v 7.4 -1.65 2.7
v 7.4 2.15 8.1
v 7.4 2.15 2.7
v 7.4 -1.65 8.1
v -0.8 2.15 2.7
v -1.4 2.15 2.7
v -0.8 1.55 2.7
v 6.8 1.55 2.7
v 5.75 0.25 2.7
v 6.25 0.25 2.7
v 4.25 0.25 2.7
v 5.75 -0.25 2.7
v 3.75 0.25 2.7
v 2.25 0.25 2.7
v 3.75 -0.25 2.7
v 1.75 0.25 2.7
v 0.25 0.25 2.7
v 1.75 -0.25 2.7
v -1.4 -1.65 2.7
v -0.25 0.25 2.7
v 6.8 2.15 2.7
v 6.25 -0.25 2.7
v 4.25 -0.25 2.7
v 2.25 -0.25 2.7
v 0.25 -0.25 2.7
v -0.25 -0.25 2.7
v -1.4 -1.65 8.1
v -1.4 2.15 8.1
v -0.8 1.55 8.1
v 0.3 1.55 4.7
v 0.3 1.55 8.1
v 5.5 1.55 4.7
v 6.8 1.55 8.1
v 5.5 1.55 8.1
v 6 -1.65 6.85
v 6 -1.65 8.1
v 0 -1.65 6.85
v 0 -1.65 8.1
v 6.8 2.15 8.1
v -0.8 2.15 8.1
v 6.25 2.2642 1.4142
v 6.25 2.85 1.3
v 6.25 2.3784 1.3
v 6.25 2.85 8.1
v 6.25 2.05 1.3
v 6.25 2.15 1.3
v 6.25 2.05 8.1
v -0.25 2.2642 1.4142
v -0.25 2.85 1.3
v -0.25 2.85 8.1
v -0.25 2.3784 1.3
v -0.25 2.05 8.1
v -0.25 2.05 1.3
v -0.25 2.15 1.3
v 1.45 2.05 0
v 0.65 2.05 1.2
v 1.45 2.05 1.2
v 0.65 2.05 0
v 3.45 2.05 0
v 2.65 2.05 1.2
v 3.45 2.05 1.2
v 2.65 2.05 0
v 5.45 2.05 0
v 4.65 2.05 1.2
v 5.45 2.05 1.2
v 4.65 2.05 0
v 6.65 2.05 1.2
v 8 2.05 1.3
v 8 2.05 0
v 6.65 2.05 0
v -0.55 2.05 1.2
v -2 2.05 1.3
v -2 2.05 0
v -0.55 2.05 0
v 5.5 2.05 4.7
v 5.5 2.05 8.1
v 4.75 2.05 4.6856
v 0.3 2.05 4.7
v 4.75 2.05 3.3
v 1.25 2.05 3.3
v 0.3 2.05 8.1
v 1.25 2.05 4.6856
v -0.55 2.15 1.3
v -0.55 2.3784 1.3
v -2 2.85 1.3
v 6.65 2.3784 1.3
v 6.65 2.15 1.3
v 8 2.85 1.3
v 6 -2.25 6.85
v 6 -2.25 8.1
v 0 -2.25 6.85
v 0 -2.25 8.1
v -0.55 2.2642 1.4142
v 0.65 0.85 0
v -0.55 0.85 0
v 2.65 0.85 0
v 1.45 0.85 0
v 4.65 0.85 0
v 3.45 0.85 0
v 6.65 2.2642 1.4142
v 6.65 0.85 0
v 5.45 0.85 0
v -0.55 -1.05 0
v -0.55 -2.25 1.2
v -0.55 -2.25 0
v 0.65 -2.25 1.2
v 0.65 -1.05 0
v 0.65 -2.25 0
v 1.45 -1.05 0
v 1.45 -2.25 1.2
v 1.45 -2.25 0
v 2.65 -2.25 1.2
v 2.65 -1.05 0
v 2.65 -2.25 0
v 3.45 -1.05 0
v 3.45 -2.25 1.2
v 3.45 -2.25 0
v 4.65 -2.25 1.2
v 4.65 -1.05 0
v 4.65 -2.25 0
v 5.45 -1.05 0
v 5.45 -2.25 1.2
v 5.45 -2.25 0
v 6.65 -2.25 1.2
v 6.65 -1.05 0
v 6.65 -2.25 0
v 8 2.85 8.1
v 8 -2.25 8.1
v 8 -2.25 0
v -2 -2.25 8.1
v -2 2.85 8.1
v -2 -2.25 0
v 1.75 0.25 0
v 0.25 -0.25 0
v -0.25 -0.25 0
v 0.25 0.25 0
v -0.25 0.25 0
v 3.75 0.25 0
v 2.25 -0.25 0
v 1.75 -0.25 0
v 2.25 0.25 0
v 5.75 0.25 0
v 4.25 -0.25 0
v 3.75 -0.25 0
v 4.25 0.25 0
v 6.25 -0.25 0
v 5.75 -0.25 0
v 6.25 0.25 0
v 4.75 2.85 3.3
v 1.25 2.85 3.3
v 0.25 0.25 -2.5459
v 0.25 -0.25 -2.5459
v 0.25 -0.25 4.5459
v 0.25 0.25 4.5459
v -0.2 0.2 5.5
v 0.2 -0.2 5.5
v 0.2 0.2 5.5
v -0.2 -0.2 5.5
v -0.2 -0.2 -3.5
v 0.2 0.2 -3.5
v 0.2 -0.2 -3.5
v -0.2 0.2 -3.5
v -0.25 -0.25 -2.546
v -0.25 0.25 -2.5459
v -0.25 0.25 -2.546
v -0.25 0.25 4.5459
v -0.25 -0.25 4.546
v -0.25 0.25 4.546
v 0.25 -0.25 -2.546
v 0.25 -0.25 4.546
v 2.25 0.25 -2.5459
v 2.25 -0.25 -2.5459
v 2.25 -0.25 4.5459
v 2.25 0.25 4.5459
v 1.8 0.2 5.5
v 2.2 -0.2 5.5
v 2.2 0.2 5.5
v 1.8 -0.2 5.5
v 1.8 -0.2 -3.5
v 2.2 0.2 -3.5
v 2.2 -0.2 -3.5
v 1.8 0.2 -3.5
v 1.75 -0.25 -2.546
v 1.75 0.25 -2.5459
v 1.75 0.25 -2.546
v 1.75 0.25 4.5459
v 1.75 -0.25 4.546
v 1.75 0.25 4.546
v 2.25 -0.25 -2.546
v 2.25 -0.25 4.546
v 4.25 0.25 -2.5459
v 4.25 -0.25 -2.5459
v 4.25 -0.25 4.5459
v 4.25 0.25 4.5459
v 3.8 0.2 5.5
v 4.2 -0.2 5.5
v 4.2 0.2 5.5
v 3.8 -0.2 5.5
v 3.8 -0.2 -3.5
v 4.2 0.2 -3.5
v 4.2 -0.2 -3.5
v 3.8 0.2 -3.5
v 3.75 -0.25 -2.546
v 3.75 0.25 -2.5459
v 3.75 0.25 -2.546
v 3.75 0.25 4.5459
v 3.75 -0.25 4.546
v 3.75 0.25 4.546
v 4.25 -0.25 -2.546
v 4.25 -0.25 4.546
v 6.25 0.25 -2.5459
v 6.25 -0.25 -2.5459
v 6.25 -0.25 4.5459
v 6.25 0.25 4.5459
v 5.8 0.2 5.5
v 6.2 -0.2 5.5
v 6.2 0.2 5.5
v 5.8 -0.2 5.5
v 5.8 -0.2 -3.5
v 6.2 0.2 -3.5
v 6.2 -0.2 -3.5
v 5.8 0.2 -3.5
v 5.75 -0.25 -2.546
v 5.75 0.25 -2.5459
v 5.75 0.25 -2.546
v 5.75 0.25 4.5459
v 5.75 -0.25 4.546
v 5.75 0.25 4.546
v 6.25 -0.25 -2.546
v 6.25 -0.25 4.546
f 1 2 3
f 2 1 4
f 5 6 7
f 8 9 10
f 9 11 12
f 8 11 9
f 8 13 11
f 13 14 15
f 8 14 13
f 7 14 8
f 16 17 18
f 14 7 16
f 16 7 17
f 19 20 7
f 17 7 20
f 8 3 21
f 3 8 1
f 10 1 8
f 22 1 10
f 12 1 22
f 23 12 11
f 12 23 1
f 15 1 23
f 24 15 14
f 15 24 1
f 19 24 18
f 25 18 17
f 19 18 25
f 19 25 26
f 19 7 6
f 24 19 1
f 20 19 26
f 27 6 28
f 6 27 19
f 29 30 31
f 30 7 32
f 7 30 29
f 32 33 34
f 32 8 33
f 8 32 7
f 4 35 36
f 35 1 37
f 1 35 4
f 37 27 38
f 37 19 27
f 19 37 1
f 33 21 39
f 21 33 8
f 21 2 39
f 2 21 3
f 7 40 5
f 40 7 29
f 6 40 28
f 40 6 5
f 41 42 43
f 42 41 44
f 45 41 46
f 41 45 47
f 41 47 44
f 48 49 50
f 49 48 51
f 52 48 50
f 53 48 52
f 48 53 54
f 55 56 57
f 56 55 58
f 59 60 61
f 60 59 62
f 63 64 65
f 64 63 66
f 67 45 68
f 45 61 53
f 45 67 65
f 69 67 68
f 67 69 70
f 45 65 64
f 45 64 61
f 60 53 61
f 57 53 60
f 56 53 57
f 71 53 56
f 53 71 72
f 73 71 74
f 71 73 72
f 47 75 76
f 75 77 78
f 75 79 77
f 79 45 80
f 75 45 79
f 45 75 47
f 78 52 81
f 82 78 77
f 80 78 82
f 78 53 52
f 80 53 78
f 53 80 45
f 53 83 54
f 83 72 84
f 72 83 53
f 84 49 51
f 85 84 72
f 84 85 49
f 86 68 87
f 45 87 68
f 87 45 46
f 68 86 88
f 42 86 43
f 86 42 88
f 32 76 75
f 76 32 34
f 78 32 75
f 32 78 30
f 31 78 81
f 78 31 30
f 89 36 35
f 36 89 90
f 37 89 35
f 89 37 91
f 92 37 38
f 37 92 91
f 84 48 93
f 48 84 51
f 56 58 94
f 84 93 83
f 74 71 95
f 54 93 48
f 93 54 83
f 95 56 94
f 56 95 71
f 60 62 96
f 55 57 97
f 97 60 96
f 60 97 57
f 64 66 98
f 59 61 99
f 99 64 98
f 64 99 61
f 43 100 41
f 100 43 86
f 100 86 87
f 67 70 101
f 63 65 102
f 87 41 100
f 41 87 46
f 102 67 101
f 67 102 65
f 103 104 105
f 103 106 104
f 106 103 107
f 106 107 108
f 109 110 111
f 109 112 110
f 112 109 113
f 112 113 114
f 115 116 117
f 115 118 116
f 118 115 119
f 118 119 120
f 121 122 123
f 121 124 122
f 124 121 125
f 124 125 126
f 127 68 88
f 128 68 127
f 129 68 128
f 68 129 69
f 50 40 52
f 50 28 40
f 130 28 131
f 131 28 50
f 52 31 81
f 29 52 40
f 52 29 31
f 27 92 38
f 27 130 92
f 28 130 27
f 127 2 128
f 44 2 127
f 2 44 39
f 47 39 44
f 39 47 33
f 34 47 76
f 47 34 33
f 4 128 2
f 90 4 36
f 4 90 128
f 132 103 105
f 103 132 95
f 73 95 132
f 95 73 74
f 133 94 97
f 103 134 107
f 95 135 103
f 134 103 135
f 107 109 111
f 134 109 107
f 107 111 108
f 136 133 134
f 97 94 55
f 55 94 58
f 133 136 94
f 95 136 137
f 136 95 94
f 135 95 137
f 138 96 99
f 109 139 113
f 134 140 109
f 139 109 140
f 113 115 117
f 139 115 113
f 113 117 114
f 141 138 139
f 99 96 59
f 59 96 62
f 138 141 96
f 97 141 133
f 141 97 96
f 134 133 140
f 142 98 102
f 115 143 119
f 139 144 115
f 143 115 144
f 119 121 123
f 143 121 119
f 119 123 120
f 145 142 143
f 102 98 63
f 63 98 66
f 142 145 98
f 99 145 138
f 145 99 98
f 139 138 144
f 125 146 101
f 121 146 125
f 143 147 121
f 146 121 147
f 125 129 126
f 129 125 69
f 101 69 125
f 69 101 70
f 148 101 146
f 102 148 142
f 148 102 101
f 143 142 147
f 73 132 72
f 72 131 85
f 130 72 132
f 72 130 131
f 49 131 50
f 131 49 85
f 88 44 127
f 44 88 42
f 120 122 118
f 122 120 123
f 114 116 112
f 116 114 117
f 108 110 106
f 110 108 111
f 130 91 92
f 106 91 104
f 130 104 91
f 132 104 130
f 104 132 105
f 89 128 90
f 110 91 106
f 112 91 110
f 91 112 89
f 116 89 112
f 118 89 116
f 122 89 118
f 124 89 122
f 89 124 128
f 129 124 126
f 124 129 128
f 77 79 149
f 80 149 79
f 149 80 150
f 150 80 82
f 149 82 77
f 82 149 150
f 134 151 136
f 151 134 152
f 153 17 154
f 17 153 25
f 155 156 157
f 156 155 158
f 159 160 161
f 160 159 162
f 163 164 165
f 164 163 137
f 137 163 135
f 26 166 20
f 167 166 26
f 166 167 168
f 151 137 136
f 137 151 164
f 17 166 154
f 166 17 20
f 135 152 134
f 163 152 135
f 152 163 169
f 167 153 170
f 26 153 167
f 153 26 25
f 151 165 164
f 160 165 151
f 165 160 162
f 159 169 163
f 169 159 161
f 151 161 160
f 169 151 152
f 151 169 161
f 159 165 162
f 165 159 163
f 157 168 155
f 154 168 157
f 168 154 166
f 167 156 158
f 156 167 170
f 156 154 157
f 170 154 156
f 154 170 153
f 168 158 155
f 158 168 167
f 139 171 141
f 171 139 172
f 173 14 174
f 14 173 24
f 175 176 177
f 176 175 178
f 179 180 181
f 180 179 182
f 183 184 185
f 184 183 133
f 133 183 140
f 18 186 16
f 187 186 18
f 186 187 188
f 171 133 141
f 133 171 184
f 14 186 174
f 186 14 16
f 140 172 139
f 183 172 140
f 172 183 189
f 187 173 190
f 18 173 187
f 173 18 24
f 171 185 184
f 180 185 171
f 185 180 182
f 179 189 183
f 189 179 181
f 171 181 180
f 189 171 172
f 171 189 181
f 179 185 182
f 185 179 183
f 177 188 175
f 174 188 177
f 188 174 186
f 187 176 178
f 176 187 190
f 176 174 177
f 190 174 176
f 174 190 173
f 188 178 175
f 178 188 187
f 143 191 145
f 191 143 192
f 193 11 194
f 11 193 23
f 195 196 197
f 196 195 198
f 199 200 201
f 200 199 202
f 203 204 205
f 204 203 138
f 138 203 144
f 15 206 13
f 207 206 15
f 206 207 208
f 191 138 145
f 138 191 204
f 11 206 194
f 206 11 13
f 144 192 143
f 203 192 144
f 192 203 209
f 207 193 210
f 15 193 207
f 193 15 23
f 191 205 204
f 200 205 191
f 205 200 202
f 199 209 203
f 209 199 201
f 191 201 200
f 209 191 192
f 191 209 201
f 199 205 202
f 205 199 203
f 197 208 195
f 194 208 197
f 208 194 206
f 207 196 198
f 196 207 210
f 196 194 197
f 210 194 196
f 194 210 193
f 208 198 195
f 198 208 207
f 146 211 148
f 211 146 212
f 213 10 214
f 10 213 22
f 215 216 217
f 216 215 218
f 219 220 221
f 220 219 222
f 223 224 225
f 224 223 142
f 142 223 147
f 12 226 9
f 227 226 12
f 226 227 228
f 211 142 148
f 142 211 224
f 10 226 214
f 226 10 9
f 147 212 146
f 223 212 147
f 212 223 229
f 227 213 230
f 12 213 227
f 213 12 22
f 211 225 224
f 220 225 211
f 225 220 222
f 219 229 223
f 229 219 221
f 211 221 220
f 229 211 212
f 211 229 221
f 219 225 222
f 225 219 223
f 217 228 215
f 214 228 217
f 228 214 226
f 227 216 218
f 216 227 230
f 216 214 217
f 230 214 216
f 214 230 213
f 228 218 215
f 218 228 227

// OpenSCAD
module pin(pin_heigth=9,pin_size=0.5,pin_angle=3,pin_chanfer=0.05)
{
    epsilon=0.01;
    difference(){
        cube([pin_size,pin_size,pin_heigth]);
        translate([-epsilon,pin_size-pin_chanfer,0])rotate([-pin_angle,0,0])cube([pin_size+2*epsilon,pin_size,pin_heigth]);
        translate([-epsilon,pin_chanfer,0])rotate([pin_angle,0,0])translate([0,-pin_size,0])cube([pin_size+2*epsilon,pin_size,pin_heigth]);     
        translate([pin_size-pin_chanfer,-epsilon,0])rotate([0,pin_angle,0])cube([pin_size,pin_size+2*epsilon,pin_heigth]);
        translate([pin_chanfer,-epsilon,0])rotate([0,-pin_angle,0])translate([-pin_size,0,0])cube([pin_size,pin_size+2*epsilon,pin_heigth]);
        translate([-epsilon,pin_size-pin_chanfer,pin_heigth])rotate([pin_angle,0,0])translate([0,0,-pin_heigth])cube([pin_size+2*epsilon,pin_size,pin_heigth]);
        translate([-epsilon,pin_chanfer,pin_heigth])rotate([-pin_angle,0,0])translate([0,-pin_size,-pin_heigth])cube([pin_size+2*epsilon,pin_size,pin_heigth]);     
        translate([pin_size-pin_chanfer,-epsilon,pin_heigth])rotate([0,-pin_angle,0])translate([0,0,-pin_heigth])cube([pin_size,pin_size+2*epsilon,pin_heigth]);
        translate([pin_chanfer,-epsilon,pin_heigth])rotate([0,pin_angle,0])translate([-pin_size,0,-pin_heigth])cube([pin_size,pin_size+2*epsilon,pin_heigth]);
     
    }
}


epsilon = 1e-3;
translate([-2,-2.25,0])union(){
    difference(){
        cube([10,5.1,8.1]);
        union(){
            translate([0.6,0.6,2.7])union(){
                cube([10-2*0.6,3.2,5.4+2*epsilon]);
                translate([8.2,0.6,0])cube([0.6,3.2,5.4+2*epsilon]);
                translate([0,0.6,0])cube([0.6,3.2,5.4+2*epsilon]);
            }
            translate([1.75,4.3,-1])cube([6.5,2,10]);
            translate([-epsilon,4.3,-epsilon])cube([10+2*epsilon,0.9+epsilon,1.3+epsilon]);
            translate([2.3,3.7,4.7])cube([5.2,1,3.4+epsilon]);
            translate([2,-epsilon,6.85])cube([6,1,1.25+epsilon]);
            translate([1.45,3.1,0])rotate([-45,0,0])cube([1.2,3,2]);
            translate([3.45,3.1,0])rotate([-45,0,0])cube([1.2,3,2]);
            translate([5.45,3.1,0])rotate([-45,0,0])cube([1.2,3,2]);
            translate([7.45,3.1,0])rotate([-45,0,0])cube([1.2,3,2]);     
            translate([1.45,-.8,2])rotate([225,0,0])cube([1.2,3,4]);
            translate([3.45,-.8,2])rotate([225,0,0])cube([1.2,3,4]);
            translate([5.45,-.8,2])rotate([225,0,0])cube([1.2,3,4]);
            translate([7.45,-.8,2])rotate([225,0,0])cube([1.2,3,4]);
            

        }
    }
    translate([3.25,3.8,3.3])
    difference(){
        cube([3.5,1.3,1.4]);
        translate([-0.5,1.3,0])rotate([30,0,0])cube([4.5,1.3,5]);
    }
    translate([1.75,2,-3.5])pin();
    translate([3.75,2,-3.5])pin();
    translate([5.75,2,-3.5])pin();
    translate([7.75,2,-3.5])pin();
}
